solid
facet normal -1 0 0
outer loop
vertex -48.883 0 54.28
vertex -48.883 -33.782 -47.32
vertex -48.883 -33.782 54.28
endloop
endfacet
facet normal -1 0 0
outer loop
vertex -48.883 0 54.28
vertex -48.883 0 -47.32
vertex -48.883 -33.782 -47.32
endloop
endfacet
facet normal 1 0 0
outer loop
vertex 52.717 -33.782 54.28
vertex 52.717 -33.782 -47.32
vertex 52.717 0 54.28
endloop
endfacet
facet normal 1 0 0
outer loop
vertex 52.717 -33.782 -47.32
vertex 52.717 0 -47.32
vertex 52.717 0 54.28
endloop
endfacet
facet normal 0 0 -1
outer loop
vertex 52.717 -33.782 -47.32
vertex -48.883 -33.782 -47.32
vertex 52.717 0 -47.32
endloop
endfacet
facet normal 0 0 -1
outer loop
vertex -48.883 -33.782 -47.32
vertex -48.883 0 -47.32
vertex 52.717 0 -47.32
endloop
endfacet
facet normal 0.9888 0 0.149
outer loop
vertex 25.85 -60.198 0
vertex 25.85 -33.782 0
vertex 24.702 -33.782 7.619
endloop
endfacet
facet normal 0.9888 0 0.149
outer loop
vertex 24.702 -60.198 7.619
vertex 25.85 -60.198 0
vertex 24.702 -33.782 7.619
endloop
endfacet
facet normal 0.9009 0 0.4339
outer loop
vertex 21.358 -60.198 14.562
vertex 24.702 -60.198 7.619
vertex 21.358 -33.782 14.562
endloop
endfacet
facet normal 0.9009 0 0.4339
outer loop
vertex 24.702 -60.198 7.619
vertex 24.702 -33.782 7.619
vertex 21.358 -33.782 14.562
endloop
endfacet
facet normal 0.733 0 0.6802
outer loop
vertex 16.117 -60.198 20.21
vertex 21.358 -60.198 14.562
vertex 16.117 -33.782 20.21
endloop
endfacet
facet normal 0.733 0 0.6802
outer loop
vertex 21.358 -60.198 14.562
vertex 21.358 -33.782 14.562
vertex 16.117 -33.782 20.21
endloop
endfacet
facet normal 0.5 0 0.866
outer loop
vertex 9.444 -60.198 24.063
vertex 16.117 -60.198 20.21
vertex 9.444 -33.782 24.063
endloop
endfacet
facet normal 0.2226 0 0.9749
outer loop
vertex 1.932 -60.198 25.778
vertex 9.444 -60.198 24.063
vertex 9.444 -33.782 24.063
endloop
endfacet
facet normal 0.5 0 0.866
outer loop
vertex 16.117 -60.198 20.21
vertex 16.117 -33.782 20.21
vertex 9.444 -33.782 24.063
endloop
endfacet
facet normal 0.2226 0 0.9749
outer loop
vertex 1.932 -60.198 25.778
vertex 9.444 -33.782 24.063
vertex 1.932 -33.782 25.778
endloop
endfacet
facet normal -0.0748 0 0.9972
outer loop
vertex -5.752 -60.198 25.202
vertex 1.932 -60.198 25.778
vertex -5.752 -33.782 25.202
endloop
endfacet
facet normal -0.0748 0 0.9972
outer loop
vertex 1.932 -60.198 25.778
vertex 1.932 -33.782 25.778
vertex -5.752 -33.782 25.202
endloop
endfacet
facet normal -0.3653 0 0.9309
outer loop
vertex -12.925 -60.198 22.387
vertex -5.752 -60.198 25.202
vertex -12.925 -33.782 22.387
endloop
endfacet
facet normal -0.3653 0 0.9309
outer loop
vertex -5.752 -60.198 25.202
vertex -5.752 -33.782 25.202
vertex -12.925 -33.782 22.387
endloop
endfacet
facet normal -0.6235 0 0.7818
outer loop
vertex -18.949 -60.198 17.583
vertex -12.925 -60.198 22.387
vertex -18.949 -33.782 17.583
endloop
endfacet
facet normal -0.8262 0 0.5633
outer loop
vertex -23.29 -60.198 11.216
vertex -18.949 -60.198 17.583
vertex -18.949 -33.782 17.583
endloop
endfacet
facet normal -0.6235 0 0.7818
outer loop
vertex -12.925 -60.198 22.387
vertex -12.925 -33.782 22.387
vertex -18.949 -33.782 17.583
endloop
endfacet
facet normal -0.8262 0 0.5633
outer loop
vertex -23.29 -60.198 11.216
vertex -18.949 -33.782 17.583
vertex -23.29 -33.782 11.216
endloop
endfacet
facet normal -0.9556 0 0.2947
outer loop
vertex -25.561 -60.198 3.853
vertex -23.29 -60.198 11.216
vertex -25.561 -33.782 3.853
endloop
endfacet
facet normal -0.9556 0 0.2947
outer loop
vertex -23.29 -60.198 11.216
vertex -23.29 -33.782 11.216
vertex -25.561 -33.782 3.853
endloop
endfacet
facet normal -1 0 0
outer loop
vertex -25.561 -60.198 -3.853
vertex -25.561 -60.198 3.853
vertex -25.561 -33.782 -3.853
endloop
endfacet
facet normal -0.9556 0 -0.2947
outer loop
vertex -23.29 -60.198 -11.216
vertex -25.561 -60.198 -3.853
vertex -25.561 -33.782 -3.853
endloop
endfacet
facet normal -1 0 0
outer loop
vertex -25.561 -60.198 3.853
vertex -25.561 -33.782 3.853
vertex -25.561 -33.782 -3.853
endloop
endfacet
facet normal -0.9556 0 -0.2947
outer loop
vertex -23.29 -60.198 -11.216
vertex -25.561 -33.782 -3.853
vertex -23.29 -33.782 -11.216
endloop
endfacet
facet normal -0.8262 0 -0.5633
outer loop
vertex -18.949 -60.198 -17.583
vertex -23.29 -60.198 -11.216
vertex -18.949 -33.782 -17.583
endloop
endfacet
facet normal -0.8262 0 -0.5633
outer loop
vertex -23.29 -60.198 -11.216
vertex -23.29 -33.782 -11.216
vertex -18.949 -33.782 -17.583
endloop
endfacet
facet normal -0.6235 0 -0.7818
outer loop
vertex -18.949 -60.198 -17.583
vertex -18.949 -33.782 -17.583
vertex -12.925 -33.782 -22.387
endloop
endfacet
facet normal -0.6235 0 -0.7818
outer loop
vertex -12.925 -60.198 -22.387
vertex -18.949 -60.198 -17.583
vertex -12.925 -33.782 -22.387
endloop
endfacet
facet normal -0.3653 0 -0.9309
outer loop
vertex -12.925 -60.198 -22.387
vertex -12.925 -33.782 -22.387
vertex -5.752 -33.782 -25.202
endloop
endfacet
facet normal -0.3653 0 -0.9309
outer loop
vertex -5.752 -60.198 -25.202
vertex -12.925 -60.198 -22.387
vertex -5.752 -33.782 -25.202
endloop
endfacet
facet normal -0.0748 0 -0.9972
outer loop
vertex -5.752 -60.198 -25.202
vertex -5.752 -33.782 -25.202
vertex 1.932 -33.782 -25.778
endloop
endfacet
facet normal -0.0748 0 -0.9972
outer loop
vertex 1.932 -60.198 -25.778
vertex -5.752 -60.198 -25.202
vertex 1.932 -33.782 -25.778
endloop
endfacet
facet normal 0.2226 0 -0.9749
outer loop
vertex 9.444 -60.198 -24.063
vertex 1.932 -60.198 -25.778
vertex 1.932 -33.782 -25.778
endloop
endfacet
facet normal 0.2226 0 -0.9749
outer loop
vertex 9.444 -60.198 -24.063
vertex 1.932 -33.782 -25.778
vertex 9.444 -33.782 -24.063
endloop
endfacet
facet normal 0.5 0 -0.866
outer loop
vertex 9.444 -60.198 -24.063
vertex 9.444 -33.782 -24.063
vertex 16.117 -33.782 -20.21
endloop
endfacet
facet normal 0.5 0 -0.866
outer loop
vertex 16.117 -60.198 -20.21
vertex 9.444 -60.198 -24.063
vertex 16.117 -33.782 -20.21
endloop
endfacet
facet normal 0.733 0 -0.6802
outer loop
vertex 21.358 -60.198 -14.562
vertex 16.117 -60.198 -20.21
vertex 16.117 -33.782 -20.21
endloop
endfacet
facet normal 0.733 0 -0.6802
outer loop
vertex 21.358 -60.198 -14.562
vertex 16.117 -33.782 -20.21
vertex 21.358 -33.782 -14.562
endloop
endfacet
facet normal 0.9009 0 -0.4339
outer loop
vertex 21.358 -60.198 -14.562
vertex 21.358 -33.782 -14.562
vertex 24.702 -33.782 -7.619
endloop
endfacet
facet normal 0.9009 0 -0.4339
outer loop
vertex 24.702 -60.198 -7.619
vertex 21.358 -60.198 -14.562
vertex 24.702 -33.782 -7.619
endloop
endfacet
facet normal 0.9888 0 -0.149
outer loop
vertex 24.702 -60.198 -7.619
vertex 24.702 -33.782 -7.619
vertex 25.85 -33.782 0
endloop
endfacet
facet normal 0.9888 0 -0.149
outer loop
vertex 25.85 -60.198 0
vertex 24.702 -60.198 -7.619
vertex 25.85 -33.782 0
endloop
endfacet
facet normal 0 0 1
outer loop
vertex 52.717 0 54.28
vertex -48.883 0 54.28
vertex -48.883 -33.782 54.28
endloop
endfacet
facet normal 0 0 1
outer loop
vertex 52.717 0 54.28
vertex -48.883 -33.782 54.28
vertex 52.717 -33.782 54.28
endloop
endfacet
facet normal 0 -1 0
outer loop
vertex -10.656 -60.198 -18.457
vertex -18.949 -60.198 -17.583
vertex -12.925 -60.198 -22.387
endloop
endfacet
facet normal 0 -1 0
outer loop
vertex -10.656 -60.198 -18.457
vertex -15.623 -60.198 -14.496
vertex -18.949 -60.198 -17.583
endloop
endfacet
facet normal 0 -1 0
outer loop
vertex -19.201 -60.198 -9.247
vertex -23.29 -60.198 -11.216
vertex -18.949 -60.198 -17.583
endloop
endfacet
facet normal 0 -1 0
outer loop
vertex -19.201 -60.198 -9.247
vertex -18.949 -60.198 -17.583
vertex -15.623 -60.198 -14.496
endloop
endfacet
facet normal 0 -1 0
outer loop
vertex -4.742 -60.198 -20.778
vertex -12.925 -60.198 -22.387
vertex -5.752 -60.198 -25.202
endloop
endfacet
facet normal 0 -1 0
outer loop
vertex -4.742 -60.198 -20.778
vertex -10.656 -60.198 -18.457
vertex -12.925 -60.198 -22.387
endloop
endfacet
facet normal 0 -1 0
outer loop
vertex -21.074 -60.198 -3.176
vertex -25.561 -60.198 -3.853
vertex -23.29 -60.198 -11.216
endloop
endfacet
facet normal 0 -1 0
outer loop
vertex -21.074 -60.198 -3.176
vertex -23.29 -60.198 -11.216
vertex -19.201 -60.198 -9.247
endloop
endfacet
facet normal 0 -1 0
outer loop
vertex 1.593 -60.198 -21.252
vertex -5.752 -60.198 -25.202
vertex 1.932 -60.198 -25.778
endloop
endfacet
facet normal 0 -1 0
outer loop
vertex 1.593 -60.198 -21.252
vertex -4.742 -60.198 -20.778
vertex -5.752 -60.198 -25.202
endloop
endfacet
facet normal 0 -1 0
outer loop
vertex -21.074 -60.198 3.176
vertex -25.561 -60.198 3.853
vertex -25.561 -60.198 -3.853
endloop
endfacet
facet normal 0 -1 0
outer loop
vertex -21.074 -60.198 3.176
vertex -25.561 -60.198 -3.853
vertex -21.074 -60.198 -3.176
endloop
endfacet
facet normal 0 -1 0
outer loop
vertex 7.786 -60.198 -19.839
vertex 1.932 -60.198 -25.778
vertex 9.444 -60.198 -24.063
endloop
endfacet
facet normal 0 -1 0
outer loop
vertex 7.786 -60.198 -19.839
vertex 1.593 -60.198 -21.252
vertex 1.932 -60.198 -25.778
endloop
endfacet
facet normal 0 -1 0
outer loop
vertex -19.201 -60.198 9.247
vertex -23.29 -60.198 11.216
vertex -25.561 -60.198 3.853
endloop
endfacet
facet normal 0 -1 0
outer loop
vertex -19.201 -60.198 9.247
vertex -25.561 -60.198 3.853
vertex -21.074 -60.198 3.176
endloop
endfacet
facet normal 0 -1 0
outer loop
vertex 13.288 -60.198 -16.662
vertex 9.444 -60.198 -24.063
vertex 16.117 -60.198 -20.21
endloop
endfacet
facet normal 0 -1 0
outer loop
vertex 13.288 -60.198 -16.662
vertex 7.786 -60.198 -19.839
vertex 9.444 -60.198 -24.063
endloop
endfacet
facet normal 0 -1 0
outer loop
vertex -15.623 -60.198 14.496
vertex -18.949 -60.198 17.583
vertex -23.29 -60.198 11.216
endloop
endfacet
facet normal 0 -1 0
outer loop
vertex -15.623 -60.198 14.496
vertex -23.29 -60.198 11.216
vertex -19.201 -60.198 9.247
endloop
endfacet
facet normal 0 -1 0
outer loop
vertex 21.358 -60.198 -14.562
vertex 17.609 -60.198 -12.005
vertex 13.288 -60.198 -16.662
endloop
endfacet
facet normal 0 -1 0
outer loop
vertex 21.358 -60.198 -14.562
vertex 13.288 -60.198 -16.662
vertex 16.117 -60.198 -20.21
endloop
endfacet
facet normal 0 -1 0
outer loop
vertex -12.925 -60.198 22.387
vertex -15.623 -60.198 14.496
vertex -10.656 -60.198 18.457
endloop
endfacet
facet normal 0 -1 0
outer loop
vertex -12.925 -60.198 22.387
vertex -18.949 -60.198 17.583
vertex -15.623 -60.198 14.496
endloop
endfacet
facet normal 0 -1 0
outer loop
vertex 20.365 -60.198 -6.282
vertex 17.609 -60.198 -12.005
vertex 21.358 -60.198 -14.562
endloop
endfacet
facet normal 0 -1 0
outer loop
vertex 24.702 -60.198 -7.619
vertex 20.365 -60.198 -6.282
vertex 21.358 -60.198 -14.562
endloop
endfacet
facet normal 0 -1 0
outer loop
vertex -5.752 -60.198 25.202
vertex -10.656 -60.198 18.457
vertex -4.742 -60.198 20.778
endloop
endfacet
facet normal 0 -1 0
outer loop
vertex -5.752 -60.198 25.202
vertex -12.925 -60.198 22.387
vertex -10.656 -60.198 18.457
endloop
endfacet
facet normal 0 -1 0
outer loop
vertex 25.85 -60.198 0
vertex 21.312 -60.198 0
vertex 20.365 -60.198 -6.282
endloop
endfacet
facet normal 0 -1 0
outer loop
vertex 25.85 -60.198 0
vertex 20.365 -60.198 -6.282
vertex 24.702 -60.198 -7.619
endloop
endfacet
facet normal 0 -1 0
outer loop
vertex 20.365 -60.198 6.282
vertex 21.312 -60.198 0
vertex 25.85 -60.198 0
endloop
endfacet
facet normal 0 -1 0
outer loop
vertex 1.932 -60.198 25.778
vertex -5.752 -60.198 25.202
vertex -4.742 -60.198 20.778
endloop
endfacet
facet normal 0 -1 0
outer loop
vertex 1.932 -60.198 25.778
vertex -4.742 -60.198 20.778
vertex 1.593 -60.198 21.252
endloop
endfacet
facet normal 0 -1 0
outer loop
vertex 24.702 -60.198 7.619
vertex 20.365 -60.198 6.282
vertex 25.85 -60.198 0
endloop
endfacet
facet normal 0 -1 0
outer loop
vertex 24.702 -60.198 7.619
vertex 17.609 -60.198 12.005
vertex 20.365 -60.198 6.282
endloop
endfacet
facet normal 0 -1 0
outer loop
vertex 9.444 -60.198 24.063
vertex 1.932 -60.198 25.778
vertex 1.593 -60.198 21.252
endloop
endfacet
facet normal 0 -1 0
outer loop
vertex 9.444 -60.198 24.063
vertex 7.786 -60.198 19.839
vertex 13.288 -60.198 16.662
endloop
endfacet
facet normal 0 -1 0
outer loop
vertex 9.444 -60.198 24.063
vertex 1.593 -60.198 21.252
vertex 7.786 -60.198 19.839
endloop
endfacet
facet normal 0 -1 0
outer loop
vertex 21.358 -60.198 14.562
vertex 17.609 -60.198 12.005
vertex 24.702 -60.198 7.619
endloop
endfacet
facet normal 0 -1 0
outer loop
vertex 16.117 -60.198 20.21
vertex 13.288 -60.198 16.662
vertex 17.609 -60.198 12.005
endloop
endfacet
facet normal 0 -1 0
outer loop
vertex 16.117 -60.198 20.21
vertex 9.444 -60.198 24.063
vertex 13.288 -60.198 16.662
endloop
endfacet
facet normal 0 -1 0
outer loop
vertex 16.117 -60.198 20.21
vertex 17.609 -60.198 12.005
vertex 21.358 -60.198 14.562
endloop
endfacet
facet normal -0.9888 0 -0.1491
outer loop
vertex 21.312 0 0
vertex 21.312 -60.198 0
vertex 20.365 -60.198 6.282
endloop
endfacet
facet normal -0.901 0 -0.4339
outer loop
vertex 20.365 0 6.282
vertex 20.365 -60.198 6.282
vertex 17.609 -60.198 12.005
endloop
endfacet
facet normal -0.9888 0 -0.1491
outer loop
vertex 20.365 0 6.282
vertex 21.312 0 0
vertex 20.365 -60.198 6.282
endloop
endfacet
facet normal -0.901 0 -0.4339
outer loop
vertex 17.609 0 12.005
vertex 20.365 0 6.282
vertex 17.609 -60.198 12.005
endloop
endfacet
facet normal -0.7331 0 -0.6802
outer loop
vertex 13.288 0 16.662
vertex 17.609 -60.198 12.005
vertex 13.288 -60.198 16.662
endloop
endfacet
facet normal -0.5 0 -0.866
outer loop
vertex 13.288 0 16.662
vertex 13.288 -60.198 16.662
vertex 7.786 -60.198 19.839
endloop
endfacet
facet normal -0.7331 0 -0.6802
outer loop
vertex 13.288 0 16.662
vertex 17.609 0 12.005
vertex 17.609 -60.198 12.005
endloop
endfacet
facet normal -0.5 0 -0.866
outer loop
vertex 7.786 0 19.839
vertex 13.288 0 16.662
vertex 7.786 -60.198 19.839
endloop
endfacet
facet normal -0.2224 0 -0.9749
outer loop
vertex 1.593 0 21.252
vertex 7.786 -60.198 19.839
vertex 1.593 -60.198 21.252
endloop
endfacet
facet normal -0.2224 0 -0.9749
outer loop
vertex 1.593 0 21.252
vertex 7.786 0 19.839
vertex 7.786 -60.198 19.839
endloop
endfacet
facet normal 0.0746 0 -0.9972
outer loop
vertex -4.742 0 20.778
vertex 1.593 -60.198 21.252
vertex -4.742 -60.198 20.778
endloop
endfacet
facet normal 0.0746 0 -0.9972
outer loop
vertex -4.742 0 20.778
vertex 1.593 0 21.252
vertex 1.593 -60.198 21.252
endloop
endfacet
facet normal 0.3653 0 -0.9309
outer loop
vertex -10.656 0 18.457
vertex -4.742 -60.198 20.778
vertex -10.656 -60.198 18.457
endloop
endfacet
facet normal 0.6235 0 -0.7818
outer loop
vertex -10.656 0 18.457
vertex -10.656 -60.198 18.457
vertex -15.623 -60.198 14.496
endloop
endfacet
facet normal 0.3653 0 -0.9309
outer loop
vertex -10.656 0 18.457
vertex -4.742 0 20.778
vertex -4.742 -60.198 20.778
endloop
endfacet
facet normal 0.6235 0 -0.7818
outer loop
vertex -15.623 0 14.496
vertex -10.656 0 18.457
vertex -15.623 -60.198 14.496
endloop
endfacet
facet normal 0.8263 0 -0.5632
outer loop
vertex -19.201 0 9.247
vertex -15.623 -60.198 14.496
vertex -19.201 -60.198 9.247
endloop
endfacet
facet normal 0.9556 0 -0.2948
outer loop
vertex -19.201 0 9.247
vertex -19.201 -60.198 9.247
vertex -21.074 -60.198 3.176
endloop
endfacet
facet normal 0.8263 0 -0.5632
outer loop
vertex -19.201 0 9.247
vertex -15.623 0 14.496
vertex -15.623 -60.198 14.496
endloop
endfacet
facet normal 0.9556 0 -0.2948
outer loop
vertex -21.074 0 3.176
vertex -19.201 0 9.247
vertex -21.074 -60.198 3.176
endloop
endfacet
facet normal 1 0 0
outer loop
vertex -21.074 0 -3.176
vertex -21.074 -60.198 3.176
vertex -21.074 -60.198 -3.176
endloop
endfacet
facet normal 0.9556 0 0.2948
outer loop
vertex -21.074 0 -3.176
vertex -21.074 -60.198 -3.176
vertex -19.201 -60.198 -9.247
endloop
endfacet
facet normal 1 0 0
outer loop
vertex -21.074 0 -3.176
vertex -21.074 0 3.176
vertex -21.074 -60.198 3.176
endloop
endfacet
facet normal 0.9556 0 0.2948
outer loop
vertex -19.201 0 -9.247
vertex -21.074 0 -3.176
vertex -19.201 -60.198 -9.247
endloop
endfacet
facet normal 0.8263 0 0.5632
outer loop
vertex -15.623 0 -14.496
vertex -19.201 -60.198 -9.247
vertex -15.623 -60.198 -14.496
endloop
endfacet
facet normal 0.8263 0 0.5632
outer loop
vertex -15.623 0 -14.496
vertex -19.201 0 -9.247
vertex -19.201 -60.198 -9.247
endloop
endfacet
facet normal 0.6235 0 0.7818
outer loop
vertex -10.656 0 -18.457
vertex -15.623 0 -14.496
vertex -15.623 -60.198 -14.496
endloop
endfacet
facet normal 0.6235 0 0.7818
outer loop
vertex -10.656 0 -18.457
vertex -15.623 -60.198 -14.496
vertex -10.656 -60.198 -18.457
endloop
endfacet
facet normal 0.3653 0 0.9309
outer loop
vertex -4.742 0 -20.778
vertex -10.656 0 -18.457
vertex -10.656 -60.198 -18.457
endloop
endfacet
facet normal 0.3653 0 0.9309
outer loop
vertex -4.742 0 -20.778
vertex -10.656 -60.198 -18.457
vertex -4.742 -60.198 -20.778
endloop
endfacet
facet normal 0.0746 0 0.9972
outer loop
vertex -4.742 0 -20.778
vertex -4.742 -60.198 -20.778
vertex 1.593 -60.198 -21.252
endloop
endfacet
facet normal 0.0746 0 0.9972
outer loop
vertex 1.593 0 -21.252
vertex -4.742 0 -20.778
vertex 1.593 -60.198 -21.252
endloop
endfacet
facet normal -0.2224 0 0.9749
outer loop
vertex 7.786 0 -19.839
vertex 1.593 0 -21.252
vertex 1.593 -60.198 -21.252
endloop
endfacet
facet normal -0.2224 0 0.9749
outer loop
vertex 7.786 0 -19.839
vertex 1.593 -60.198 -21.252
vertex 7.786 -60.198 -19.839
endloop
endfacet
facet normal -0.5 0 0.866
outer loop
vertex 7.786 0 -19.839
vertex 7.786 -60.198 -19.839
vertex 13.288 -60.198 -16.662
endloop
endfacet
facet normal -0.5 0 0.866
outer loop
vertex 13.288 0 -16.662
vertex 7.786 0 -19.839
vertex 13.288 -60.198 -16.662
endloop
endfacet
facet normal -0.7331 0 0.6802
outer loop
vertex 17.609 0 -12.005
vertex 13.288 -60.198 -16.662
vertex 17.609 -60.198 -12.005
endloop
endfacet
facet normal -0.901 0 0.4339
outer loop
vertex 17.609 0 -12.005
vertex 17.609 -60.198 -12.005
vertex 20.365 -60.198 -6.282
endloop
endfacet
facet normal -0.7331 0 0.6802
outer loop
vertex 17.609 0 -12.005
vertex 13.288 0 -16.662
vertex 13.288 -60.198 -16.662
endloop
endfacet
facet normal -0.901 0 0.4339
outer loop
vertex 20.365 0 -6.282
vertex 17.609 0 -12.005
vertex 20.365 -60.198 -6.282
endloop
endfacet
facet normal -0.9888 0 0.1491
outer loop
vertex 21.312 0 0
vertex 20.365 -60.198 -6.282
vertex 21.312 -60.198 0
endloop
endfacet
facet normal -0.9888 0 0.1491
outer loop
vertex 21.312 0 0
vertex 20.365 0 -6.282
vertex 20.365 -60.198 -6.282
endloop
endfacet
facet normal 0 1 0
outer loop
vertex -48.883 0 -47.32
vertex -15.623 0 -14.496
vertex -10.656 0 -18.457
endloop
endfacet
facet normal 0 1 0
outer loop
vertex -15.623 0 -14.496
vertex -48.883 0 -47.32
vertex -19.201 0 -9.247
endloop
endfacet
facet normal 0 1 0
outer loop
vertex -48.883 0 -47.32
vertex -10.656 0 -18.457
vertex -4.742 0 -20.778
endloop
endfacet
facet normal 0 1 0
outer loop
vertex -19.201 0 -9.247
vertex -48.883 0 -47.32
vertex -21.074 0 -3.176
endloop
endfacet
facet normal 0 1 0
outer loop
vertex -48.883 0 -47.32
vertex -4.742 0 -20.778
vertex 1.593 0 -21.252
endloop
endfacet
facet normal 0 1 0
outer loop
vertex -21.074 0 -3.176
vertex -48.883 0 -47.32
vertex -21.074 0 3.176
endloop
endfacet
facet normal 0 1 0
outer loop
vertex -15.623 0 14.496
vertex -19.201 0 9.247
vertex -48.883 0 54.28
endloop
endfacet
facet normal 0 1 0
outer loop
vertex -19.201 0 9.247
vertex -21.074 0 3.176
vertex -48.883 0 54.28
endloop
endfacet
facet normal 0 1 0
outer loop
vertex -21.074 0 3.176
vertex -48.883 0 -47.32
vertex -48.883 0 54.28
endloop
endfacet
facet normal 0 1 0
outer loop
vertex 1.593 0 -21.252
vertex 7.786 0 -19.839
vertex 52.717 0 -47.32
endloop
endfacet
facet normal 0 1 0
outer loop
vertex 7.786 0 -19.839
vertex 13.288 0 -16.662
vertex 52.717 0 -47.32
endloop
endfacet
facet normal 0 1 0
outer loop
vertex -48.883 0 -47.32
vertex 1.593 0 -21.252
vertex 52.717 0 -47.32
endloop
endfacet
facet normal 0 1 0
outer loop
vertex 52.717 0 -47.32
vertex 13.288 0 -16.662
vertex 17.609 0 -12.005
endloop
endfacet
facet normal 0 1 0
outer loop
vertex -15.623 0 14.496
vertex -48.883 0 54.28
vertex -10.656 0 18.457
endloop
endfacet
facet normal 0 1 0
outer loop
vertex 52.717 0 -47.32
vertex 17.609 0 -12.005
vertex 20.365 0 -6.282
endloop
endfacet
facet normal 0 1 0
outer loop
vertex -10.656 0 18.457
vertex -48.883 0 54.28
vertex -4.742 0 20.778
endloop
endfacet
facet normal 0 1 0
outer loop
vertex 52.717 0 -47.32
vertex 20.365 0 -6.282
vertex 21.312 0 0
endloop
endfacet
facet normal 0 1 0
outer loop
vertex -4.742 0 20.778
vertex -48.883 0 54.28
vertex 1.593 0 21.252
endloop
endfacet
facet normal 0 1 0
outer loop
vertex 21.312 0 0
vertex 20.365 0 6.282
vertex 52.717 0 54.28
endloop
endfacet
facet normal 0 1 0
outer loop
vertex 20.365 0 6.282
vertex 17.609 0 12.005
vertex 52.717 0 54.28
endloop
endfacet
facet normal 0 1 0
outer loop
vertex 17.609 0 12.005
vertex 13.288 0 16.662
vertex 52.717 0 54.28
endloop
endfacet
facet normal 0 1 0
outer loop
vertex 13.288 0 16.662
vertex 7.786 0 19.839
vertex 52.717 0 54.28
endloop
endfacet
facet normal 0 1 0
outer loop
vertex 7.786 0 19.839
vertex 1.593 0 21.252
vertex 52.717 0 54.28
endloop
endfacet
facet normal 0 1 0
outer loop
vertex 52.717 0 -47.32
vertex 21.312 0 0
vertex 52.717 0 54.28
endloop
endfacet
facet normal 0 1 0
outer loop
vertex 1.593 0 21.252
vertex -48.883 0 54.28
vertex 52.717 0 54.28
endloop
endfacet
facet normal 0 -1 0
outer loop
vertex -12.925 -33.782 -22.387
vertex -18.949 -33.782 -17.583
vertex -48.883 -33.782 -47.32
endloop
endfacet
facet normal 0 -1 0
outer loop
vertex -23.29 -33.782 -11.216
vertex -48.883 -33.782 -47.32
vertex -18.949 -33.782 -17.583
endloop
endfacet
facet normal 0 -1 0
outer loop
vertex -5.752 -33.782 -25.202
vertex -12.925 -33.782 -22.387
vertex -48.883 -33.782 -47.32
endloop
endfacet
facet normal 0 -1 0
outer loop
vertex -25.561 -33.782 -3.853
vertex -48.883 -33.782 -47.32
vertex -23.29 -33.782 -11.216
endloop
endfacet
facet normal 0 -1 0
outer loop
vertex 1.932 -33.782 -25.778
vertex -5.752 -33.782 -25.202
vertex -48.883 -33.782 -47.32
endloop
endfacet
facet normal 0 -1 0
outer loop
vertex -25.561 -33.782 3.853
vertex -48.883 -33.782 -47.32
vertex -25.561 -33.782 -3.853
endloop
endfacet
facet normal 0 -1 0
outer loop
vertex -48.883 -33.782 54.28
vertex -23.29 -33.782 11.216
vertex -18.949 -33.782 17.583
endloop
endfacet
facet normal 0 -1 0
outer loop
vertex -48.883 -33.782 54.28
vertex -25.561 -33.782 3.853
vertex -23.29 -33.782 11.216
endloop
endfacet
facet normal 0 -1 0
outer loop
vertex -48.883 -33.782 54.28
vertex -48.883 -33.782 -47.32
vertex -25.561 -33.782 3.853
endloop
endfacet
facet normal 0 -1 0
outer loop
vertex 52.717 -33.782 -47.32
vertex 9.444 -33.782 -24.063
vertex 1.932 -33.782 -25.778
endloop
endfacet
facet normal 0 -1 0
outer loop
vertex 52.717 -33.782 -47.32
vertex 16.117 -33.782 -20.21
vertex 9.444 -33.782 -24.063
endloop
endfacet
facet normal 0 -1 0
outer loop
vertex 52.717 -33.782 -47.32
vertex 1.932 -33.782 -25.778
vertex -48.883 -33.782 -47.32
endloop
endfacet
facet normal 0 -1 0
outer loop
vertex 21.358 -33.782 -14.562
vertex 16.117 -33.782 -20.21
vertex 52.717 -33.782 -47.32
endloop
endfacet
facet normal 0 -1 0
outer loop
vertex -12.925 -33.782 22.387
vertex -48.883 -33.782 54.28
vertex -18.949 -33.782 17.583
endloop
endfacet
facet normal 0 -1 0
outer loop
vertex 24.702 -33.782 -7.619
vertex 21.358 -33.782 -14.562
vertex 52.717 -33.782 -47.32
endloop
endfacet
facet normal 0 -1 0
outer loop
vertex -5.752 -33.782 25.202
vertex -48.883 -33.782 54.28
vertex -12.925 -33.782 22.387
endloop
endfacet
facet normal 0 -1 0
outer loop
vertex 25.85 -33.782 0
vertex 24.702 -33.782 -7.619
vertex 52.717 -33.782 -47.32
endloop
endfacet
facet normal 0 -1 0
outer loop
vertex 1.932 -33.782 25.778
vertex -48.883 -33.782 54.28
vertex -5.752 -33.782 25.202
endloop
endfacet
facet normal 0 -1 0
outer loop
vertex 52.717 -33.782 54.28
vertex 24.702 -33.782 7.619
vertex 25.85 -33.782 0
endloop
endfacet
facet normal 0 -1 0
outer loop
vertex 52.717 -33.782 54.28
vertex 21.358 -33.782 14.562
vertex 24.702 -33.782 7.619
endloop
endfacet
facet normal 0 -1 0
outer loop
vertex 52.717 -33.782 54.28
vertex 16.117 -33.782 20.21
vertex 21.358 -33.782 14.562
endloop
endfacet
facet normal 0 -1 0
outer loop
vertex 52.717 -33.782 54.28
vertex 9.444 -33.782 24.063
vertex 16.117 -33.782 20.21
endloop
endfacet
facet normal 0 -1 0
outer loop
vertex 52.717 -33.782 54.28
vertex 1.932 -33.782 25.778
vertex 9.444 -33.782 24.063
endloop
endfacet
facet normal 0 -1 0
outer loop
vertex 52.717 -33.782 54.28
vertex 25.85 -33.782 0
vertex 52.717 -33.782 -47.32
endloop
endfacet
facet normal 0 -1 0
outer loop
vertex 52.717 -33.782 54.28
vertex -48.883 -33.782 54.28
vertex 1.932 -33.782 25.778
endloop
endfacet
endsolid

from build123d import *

# Parameters (mm, degrees)
F0_W      = 101.6
F0_H      = 101.6
F0_R      = 25.850077
F1_DEPTH  = 25.4
F0_R_2    = 21.312016
F2_DEPTH  = 60.198
F1_FACE_W = 101.6
F1_FACE_H = 101.6
F1_FACE_R = 25.850077
F3_DEPTH  = 8.382


with BuildPart() as f1:
    # F0 (on Front) → F1 (new body)
    with BuildSketch(Plane.XZ):
        with Locations((1.916589, 3.479792)):
            Rectangle(F0_W, F0_H)
        Circle(F0_R, mode=Mode.SUBTRACT)
    extrude(amount=F1_DEPTH)

    # F0 (on Front) → F2 (join)
    with BuildSketch(Plane.XZ):
        Circle(F0_R)
        Circle(F0_R_2, mode=Mode.SUBTRACT)
    extrude(amount=F2_DEPTH)

    # F1_face (on face) → F3 (join)
    with BuildSketch(Plane(origin=(2.40587, -25.4, 4.368139), x_dir=(1, 0, 0), z_dir=(0, -1, 0))):
        with Locations((-0.489281, -0.888347)):
            Rectangle(F1_FACE_W, F1_FACE_H)
        with Locations((-2.40587, -4.368139)):
            Circle(F1_FACE_R, mode=Mode.SUBTRACT)
    extrude(amount=F3_DEPTH)


solid = f1.part
